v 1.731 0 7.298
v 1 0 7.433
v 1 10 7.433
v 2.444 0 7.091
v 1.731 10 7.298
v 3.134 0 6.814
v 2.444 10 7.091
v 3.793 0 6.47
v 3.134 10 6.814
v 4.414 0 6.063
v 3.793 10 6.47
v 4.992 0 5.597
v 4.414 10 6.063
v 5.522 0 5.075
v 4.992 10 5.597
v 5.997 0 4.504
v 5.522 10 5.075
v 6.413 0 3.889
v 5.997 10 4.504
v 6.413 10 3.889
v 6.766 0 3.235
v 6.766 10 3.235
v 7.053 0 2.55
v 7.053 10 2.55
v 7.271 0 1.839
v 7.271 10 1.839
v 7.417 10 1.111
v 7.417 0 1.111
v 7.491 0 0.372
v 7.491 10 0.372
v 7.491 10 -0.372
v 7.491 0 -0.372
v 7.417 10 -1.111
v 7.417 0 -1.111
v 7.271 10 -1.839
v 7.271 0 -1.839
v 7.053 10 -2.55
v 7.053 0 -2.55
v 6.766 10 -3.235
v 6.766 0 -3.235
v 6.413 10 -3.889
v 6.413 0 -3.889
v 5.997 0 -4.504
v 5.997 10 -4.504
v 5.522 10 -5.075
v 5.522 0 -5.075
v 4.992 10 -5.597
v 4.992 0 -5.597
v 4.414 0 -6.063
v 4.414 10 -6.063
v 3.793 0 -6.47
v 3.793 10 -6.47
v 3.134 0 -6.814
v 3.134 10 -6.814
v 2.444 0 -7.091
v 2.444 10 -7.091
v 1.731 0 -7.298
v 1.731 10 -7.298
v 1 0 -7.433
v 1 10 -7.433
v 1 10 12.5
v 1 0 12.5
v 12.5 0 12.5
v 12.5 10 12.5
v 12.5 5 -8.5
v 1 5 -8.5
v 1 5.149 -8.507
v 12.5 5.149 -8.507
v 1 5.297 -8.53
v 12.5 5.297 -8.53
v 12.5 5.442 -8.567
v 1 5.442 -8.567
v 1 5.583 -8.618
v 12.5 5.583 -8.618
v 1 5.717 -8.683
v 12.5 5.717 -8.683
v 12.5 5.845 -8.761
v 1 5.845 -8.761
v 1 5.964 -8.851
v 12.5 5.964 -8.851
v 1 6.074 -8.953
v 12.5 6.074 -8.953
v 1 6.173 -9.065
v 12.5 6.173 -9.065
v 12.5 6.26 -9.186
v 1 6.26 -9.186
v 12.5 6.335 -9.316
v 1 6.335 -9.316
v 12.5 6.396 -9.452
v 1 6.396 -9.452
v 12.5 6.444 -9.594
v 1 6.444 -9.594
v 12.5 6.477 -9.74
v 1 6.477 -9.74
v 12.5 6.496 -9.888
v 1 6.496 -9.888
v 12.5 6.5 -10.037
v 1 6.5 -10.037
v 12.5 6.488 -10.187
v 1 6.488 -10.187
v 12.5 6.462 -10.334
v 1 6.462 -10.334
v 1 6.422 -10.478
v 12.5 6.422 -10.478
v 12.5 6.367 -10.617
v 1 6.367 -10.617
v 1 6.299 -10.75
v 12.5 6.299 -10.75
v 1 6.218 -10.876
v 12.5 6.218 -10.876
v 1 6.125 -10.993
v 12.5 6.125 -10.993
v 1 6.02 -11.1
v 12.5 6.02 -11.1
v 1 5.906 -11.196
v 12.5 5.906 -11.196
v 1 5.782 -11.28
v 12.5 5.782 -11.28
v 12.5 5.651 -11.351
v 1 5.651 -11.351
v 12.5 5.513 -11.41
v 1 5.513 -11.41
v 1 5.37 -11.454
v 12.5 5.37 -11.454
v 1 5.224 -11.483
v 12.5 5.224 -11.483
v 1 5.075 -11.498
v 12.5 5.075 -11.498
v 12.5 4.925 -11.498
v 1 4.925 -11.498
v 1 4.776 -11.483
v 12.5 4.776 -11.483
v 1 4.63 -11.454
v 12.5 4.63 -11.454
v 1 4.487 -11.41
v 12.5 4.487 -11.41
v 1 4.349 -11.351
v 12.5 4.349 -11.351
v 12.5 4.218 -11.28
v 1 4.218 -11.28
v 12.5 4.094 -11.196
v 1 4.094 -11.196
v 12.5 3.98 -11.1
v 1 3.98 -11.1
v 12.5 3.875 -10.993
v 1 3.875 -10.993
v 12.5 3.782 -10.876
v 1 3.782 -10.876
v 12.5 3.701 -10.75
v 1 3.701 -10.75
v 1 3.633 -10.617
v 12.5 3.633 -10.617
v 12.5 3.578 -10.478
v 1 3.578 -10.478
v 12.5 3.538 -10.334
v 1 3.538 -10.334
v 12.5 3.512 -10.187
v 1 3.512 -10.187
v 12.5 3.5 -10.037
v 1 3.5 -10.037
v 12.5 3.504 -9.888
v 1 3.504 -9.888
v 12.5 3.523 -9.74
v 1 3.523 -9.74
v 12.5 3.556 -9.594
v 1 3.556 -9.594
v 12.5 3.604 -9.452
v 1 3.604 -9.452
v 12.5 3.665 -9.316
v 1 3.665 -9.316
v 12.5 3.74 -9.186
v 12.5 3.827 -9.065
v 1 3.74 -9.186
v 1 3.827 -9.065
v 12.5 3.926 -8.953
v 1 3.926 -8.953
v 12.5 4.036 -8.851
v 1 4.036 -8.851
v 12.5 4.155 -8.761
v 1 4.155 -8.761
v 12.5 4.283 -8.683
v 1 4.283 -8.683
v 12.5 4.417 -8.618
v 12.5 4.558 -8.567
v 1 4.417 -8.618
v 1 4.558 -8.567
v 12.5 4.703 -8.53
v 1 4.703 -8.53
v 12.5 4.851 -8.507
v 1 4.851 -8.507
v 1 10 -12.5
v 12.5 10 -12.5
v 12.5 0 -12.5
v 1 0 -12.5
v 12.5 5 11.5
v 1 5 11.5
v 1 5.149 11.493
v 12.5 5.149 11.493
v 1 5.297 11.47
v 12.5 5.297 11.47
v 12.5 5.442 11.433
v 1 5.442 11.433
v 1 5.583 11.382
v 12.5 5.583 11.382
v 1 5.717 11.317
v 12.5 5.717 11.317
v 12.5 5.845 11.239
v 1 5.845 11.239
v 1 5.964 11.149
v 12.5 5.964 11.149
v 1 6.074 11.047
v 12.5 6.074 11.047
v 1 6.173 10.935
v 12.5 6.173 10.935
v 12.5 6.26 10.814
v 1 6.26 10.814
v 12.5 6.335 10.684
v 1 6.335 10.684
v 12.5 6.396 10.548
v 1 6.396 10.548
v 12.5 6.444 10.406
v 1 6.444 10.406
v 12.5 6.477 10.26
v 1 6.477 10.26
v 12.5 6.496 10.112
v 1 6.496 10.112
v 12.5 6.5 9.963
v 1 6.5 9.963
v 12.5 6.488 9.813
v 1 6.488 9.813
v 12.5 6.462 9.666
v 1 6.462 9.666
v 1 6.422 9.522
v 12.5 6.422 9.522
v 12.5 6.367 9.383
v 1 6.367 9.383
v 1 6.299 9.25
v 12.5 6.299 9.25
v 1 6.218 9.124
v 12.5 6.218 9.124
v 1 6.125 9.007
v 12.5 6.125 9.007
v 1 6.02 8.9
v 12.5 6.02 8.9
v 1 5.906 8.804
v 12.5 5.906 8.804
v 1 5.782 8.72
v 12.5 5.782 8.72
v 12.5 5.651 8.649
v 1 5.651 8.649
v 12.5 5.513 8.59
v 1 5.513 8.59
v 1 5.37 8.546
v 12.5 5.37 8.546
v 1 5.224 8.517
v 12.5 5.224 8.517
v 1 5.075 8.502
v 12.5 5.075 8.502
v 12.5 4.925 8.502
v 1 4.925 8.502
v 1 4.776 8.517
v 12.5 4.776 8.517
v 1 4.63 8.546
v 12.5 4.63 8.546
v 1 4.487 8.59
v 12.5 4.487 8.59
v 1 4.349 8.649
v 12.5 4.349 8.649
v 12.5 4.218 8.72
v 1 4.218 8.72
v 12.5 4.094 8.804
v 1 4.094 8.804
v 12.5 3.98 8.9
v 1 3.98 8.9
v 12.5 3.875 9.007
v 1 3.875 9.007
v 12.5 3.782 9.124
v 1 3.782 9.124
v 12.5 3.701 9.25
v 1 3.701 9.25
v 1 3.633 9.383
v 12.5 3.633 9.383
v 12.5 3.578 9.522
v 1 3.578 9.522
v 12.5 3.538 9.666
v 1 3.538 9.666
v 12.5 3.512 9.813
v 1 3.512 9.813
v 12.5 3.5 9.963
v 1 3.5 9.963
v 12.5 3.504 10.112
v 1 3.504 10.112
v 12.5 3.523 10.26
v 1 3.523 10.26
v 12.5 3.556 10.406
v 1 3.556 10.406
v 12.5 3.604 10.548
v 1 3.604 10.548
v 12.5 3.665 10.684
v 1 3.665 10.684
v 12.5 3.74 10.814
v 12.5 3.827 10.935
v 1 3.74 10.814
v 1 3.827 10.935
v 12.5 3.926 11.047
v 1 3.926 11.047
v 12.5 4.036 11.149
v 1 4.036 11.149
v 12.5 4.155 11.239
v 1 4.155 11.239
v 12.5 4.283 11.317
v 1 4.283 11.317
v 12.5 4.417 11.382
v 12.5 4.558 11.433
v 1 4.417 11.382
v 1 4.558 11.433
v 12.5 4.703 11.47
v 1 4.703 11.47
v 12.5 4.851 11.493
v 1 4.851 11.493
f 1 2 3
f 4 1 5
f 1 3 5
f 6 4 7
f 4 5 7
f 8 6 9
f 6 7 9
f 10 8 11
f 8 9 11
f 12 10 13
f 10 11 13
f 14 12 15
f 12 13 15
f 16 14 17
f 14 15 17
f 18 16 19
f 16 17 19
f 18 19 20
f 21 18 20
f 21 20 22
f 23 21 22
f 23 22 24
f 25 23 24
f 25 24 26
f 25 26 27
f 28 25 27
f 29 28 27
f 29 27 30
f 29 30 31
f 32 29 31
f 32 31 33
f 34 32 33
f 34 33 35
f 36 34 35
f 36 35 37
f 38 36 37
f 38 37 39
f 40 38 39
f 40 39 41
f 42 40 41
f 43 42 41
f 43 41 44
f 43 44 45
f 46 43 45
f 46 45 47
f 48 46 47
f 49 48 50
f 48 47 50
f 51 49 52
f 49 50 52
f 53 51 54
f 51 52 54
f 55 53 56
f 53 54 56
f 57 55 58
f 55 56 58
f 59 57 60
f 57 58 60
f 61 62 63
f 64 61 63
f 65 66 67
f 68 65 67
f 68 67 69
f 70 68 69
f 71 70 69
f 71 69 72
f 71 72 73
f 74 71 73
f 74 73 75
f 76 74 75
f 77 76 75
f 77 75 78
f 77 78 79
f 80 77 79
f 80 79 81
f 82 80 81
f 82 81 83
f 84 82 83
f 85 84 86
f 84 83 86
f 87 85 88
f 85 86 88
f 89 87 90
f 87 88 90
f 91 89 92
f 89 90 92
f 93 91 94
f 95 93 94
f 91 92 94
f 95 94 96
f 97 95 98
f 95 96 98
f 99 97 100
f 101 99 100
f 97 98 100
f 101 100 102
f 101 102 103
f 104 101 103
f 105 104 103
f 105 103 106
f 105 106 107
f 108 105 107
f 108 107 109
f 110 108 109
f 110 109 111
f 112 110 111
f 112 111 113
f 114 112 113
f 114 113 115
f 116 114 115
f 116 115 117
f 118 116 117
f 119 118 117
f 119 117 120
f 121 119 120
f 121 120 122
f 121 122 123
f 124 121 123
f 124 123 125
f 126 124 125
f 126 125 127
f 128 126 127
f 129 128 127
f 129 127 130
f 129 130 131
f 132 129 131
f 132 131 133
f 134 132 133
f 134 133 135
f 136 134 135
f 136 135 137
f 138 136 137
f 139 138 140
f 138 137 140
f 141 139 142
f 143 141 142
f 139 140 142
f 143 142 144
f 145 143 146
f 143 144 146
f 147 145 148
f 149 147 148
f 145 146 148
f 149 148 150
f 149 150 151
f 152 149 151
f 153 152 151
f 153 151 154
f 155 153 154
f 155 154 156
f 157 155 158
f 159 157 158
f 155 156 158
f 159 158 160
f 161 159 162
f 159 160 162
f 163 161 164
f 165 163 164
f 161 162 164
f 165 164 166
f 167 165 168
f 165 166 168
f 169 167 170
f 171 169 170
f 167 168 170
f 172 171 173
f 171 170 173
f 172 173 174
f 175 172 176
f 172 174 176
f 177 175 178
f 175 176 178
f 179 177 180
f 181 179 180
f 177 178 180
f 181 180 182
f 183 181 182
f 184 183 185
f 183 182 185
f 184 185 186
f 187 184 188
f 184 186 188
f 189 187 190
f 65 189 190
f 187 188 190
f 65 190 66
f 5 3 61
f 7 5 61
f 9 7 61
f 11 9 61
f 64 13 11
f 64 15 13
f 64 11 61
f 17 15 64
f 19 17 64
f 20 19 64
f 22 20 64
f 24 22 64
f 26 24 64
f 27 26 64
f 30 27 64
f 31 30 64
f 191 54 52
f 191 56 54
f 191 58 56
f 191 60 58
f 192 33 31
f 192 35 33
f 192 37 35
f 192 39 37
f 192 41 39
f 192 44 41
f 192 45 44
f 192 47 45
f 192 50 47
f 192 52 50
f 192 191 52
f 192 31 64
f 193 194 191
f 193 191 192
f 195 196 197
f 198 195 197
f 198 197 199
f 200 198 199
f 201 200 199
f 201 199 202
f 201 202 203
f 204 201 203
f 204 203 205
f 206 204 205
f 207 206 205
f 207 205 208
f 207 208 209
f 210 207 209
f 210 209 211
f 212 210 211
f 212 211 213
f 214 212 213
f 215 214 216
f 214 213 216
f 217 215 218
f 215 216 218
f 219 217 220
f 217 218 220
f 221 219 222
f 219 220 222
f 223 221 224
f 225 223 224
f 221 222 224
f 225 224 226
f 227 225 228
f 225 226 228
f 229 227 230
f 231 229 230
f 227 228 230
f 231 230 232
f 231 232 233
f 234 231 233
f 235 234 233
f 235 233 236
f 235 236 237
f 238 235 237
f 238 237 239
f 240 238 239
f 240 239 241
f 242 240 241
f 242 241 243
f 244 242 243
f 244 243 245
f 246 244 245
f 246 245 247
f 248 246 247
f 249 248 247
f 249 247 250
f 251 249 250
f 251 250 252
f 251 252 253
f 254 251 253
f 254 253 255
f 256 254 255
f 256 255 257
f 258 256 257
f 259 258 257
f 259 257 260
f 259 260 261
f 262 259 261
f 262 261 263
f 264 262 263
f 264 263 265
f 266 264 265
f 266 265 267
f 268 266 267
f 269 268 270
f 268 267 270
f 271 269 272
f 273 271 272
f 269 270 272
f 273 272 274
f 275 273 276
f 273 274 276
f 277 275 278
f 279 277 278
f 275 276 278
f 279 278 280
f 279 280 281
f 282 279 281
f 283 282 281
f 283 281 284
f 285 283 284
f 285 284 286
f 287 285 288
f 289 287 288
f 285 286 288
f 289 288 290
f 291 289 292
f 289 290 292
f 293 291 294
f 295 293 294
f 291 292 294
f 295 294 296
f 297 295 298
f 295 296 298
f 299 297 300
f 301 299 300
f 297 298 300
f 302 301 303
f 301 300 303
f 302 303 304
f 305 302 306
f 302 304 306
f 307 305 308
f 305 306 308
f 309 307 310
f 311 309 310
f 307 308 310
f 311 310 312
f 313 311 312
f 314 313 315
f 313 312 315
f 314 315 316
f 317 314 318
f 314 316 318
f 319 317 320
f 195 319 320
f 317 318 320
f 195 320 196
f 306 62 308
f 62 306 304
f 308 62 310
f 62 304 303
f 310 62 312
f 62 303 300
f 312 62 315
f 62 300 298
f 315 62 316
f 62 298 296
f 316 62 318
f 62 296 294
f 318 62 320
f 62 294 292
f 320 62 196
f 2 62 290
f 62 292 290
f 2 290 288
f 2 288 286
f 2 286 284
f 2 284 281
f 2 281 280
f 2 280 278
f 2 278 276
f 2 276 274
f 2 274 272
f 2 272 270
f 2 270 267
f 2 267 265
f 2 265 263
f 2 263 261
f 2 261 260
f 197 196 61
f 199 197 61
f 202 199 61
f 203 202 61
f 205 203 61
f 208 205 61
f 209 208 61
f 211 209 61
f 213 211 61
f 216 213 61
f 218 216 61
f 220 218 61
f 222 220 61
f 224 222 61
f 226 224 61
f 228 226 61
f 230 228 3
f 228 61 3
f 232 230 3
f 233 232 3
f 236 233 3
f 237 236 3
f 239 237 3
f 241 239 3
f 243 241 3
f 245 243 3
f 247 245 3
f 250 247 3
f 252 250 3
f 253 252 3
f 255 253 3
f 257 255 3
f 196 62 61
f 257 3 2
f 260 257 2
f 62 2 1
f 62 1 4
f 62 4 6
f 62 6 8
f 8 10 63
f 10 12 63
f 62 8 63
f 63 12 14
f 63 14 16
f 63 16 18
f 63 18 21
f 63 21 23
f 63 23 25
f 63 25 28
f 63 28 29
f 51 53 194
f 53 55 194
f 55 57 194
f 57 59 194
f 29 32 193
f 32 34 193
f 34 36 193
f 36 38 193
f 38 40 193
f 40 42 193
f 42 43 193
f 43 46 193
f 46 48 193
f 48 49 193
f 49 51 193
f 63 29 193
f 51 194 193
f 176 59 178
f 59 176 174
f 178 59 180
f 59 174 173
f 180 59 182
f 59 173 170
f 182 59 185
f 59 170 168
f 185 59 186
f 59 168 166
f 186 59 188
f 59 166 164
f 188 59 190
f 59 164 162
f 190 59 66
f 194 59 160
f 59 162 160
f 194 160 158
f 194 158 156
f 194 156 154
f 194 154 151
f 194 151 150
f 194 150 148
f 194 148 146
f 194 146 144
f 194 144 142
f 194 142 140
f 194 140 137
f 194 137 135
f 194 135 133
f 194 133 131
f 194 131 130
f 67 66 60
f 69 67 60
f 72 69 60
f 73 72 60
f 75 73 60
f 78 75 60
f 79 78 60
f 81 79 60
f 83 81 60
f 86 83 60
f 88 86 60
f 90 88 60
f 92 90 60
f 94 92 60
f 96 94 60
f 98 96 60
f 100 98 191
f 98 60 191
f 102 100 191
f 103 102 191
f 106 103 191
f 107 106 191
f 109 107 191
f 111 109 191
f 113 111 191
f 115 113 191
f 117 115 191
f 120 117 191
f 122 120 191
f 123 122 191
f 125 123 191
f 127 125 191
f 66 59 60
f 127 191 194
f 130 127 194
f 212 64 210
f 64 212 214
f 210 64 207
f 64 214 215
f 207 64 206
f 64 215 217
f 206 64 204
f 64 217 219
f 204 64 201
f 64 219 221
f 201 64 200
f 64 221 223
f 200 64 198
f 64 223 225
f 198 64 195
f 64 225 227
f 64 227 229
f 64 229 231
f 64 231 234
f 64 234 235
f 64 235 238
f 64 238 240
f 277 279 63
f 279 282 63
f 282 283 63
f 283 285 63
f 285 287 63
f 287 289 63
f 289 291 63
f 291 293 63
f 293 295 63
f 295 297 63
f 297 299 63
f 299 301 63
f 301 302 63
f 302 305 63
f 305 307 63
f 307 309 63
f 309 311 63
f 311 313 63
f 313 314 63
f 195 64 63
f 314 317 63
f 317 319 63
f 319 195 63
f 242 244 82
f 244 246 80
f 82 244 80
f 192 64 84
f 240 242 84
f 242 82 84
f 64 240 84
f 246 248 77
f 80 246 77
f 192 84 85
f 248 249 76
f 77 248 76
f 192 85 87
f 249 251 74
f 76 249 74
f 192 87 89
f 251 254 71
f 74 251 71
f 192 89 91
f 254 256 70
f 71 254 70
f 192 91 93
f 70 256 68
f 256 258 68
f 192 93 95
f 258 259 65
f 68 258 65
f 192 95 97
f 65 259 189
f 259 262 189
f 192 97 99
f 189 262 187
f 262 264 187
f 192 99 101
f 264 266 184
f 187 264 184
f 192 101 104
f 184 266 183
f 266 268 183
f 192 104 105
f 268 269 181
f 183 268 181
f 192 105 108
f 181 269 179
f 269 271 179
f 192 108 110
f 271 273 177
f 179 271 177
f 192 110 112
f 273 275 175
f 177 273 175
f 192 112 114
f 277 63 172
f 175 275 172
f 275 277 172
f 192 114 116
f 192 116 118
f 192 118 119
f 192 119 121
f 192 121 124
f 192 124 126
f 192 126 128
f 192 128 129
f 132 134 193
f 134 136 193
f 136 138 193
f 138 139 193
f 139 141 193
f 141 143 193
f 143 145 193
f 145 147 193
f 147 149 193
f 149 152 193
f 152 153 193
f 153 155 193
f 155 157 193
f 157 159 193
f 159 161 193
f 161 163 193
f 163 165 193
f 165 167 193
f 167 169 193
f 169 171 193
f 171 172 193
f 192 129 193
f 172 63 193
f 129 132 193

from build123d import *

# Parameters (mm, degrees)
SKETCH1_W           = 25
SKETCH1_H           = 25
BOSS_EXTRUDE1_DEPTH = 10
SKETCH2_R           = 7.5
CUT_EXTRUDE1_DEPTH  = 21.310096012
SKETCH3_W           = 12.5
SKETCH3_H           = 25
CUT_EXTRUDE2_DEPTH  = 10
SKETCH4_R           = 1.5
CUT_EXTRUDE3_DEPTH  = 21.310096012
CUT_EXTRUDE4_DEPTH  = 21.310096012


with BuildPart() as part:
    # Sketch1 → Boss-Extrude1 (new body)
    with BuildSketch(Plane(origin=(0, 0, 0), x_dir=(1, 0, 0), z_dir=(0, 1, 0))):
        Rectangle(SKETCH1_W, SKETCH1_H)
    extrude(amount=BOSS_EXTRUDE1_DEPTH)

    # Sketch2 → Cut-Extrude1 (cut, through all)
    with BuildSketch(Plane(origin=(0, 10, 0), x_dir=(1, 0, 0), z_dir=(0, 1, 0))):
        with Locations(Location((0, 0, 0), (0, 0, 270))):
            Circle(SKETCH2_R)
    extrude(amount=-CUT_EXTRUDE1_DEPTH, mode=Mode.SUBTRACT)

    # Sketch3 → Cut-Extrude2 (cut)
    with BuildSketch(Plane(origin=(0, 10, 0), x_dir=(1, 0, 0), z_dir=(0, 1, 0))):
        with Locations((-6.25, 0)):
            Rectangle(SKETCH3_W, SKETCH3_H)
    extrude(amount=-CUT_EXTRUDE2_DEPTH, mode=Mode.SUBTRACT)

    # Sketch4 → Cut-Extrude3 (cut, through all)
    with BuildSketch(Plane.ZY):
        with Locations((-10, 5)):
            Circle(SKETCH4_R)
        with Locations((10, 5)):
            Circle(SKETCH4_R)
    extrude(amount=-CUT_EXTRUDE3_DEPTH, mode=Mode.SUBTRACT)

    # Sketch5 → Cut-Extrude4 (cut, through all)
    with BuildSketch(Plane(origin=(0, 10, 0), x_dir=(1, 0, 0), z_dir=(0, 1, 0))):
        with BuildLine():
            Line((1, 12.5), (0, 12.5))
            Line((0, 12.5), (0, 7.5))
            ThreePointArc((0, 7.5), (0.501119845, 7.483239867), (1, 7.433034374))
            Line((1, 7.433034374), (1, 12.5))
        make_face()
        with BuildLine():
            ThreePointArc((1, -7.433034374), (0.501119845, -7.483239867), (0, -7.5))
            Line((0, -7.5), (0, -12.5))
            Line((0, -12.5), (1, -12.5))
            Line((1, -12.5), (1, -7.433034374))
        make_face()
        with BuildLine():
            ThreePointArc((1, 7.433034374), (0.501119845, 7.483239867), (0, 7.5))
            Line((0, 7.5), (0, -7.5))
            ThreePointArc((0, -7.5), (0.501119845, -7.483239867), (1, -7.433034374))
            Line((1, -7.433034374), (1, 7.433034374))
        make_face()
    extrude(amount=-CUT_EXTRUDE4_DEPTH, mode=Mode.SUBTRACT)


solid = part.part
